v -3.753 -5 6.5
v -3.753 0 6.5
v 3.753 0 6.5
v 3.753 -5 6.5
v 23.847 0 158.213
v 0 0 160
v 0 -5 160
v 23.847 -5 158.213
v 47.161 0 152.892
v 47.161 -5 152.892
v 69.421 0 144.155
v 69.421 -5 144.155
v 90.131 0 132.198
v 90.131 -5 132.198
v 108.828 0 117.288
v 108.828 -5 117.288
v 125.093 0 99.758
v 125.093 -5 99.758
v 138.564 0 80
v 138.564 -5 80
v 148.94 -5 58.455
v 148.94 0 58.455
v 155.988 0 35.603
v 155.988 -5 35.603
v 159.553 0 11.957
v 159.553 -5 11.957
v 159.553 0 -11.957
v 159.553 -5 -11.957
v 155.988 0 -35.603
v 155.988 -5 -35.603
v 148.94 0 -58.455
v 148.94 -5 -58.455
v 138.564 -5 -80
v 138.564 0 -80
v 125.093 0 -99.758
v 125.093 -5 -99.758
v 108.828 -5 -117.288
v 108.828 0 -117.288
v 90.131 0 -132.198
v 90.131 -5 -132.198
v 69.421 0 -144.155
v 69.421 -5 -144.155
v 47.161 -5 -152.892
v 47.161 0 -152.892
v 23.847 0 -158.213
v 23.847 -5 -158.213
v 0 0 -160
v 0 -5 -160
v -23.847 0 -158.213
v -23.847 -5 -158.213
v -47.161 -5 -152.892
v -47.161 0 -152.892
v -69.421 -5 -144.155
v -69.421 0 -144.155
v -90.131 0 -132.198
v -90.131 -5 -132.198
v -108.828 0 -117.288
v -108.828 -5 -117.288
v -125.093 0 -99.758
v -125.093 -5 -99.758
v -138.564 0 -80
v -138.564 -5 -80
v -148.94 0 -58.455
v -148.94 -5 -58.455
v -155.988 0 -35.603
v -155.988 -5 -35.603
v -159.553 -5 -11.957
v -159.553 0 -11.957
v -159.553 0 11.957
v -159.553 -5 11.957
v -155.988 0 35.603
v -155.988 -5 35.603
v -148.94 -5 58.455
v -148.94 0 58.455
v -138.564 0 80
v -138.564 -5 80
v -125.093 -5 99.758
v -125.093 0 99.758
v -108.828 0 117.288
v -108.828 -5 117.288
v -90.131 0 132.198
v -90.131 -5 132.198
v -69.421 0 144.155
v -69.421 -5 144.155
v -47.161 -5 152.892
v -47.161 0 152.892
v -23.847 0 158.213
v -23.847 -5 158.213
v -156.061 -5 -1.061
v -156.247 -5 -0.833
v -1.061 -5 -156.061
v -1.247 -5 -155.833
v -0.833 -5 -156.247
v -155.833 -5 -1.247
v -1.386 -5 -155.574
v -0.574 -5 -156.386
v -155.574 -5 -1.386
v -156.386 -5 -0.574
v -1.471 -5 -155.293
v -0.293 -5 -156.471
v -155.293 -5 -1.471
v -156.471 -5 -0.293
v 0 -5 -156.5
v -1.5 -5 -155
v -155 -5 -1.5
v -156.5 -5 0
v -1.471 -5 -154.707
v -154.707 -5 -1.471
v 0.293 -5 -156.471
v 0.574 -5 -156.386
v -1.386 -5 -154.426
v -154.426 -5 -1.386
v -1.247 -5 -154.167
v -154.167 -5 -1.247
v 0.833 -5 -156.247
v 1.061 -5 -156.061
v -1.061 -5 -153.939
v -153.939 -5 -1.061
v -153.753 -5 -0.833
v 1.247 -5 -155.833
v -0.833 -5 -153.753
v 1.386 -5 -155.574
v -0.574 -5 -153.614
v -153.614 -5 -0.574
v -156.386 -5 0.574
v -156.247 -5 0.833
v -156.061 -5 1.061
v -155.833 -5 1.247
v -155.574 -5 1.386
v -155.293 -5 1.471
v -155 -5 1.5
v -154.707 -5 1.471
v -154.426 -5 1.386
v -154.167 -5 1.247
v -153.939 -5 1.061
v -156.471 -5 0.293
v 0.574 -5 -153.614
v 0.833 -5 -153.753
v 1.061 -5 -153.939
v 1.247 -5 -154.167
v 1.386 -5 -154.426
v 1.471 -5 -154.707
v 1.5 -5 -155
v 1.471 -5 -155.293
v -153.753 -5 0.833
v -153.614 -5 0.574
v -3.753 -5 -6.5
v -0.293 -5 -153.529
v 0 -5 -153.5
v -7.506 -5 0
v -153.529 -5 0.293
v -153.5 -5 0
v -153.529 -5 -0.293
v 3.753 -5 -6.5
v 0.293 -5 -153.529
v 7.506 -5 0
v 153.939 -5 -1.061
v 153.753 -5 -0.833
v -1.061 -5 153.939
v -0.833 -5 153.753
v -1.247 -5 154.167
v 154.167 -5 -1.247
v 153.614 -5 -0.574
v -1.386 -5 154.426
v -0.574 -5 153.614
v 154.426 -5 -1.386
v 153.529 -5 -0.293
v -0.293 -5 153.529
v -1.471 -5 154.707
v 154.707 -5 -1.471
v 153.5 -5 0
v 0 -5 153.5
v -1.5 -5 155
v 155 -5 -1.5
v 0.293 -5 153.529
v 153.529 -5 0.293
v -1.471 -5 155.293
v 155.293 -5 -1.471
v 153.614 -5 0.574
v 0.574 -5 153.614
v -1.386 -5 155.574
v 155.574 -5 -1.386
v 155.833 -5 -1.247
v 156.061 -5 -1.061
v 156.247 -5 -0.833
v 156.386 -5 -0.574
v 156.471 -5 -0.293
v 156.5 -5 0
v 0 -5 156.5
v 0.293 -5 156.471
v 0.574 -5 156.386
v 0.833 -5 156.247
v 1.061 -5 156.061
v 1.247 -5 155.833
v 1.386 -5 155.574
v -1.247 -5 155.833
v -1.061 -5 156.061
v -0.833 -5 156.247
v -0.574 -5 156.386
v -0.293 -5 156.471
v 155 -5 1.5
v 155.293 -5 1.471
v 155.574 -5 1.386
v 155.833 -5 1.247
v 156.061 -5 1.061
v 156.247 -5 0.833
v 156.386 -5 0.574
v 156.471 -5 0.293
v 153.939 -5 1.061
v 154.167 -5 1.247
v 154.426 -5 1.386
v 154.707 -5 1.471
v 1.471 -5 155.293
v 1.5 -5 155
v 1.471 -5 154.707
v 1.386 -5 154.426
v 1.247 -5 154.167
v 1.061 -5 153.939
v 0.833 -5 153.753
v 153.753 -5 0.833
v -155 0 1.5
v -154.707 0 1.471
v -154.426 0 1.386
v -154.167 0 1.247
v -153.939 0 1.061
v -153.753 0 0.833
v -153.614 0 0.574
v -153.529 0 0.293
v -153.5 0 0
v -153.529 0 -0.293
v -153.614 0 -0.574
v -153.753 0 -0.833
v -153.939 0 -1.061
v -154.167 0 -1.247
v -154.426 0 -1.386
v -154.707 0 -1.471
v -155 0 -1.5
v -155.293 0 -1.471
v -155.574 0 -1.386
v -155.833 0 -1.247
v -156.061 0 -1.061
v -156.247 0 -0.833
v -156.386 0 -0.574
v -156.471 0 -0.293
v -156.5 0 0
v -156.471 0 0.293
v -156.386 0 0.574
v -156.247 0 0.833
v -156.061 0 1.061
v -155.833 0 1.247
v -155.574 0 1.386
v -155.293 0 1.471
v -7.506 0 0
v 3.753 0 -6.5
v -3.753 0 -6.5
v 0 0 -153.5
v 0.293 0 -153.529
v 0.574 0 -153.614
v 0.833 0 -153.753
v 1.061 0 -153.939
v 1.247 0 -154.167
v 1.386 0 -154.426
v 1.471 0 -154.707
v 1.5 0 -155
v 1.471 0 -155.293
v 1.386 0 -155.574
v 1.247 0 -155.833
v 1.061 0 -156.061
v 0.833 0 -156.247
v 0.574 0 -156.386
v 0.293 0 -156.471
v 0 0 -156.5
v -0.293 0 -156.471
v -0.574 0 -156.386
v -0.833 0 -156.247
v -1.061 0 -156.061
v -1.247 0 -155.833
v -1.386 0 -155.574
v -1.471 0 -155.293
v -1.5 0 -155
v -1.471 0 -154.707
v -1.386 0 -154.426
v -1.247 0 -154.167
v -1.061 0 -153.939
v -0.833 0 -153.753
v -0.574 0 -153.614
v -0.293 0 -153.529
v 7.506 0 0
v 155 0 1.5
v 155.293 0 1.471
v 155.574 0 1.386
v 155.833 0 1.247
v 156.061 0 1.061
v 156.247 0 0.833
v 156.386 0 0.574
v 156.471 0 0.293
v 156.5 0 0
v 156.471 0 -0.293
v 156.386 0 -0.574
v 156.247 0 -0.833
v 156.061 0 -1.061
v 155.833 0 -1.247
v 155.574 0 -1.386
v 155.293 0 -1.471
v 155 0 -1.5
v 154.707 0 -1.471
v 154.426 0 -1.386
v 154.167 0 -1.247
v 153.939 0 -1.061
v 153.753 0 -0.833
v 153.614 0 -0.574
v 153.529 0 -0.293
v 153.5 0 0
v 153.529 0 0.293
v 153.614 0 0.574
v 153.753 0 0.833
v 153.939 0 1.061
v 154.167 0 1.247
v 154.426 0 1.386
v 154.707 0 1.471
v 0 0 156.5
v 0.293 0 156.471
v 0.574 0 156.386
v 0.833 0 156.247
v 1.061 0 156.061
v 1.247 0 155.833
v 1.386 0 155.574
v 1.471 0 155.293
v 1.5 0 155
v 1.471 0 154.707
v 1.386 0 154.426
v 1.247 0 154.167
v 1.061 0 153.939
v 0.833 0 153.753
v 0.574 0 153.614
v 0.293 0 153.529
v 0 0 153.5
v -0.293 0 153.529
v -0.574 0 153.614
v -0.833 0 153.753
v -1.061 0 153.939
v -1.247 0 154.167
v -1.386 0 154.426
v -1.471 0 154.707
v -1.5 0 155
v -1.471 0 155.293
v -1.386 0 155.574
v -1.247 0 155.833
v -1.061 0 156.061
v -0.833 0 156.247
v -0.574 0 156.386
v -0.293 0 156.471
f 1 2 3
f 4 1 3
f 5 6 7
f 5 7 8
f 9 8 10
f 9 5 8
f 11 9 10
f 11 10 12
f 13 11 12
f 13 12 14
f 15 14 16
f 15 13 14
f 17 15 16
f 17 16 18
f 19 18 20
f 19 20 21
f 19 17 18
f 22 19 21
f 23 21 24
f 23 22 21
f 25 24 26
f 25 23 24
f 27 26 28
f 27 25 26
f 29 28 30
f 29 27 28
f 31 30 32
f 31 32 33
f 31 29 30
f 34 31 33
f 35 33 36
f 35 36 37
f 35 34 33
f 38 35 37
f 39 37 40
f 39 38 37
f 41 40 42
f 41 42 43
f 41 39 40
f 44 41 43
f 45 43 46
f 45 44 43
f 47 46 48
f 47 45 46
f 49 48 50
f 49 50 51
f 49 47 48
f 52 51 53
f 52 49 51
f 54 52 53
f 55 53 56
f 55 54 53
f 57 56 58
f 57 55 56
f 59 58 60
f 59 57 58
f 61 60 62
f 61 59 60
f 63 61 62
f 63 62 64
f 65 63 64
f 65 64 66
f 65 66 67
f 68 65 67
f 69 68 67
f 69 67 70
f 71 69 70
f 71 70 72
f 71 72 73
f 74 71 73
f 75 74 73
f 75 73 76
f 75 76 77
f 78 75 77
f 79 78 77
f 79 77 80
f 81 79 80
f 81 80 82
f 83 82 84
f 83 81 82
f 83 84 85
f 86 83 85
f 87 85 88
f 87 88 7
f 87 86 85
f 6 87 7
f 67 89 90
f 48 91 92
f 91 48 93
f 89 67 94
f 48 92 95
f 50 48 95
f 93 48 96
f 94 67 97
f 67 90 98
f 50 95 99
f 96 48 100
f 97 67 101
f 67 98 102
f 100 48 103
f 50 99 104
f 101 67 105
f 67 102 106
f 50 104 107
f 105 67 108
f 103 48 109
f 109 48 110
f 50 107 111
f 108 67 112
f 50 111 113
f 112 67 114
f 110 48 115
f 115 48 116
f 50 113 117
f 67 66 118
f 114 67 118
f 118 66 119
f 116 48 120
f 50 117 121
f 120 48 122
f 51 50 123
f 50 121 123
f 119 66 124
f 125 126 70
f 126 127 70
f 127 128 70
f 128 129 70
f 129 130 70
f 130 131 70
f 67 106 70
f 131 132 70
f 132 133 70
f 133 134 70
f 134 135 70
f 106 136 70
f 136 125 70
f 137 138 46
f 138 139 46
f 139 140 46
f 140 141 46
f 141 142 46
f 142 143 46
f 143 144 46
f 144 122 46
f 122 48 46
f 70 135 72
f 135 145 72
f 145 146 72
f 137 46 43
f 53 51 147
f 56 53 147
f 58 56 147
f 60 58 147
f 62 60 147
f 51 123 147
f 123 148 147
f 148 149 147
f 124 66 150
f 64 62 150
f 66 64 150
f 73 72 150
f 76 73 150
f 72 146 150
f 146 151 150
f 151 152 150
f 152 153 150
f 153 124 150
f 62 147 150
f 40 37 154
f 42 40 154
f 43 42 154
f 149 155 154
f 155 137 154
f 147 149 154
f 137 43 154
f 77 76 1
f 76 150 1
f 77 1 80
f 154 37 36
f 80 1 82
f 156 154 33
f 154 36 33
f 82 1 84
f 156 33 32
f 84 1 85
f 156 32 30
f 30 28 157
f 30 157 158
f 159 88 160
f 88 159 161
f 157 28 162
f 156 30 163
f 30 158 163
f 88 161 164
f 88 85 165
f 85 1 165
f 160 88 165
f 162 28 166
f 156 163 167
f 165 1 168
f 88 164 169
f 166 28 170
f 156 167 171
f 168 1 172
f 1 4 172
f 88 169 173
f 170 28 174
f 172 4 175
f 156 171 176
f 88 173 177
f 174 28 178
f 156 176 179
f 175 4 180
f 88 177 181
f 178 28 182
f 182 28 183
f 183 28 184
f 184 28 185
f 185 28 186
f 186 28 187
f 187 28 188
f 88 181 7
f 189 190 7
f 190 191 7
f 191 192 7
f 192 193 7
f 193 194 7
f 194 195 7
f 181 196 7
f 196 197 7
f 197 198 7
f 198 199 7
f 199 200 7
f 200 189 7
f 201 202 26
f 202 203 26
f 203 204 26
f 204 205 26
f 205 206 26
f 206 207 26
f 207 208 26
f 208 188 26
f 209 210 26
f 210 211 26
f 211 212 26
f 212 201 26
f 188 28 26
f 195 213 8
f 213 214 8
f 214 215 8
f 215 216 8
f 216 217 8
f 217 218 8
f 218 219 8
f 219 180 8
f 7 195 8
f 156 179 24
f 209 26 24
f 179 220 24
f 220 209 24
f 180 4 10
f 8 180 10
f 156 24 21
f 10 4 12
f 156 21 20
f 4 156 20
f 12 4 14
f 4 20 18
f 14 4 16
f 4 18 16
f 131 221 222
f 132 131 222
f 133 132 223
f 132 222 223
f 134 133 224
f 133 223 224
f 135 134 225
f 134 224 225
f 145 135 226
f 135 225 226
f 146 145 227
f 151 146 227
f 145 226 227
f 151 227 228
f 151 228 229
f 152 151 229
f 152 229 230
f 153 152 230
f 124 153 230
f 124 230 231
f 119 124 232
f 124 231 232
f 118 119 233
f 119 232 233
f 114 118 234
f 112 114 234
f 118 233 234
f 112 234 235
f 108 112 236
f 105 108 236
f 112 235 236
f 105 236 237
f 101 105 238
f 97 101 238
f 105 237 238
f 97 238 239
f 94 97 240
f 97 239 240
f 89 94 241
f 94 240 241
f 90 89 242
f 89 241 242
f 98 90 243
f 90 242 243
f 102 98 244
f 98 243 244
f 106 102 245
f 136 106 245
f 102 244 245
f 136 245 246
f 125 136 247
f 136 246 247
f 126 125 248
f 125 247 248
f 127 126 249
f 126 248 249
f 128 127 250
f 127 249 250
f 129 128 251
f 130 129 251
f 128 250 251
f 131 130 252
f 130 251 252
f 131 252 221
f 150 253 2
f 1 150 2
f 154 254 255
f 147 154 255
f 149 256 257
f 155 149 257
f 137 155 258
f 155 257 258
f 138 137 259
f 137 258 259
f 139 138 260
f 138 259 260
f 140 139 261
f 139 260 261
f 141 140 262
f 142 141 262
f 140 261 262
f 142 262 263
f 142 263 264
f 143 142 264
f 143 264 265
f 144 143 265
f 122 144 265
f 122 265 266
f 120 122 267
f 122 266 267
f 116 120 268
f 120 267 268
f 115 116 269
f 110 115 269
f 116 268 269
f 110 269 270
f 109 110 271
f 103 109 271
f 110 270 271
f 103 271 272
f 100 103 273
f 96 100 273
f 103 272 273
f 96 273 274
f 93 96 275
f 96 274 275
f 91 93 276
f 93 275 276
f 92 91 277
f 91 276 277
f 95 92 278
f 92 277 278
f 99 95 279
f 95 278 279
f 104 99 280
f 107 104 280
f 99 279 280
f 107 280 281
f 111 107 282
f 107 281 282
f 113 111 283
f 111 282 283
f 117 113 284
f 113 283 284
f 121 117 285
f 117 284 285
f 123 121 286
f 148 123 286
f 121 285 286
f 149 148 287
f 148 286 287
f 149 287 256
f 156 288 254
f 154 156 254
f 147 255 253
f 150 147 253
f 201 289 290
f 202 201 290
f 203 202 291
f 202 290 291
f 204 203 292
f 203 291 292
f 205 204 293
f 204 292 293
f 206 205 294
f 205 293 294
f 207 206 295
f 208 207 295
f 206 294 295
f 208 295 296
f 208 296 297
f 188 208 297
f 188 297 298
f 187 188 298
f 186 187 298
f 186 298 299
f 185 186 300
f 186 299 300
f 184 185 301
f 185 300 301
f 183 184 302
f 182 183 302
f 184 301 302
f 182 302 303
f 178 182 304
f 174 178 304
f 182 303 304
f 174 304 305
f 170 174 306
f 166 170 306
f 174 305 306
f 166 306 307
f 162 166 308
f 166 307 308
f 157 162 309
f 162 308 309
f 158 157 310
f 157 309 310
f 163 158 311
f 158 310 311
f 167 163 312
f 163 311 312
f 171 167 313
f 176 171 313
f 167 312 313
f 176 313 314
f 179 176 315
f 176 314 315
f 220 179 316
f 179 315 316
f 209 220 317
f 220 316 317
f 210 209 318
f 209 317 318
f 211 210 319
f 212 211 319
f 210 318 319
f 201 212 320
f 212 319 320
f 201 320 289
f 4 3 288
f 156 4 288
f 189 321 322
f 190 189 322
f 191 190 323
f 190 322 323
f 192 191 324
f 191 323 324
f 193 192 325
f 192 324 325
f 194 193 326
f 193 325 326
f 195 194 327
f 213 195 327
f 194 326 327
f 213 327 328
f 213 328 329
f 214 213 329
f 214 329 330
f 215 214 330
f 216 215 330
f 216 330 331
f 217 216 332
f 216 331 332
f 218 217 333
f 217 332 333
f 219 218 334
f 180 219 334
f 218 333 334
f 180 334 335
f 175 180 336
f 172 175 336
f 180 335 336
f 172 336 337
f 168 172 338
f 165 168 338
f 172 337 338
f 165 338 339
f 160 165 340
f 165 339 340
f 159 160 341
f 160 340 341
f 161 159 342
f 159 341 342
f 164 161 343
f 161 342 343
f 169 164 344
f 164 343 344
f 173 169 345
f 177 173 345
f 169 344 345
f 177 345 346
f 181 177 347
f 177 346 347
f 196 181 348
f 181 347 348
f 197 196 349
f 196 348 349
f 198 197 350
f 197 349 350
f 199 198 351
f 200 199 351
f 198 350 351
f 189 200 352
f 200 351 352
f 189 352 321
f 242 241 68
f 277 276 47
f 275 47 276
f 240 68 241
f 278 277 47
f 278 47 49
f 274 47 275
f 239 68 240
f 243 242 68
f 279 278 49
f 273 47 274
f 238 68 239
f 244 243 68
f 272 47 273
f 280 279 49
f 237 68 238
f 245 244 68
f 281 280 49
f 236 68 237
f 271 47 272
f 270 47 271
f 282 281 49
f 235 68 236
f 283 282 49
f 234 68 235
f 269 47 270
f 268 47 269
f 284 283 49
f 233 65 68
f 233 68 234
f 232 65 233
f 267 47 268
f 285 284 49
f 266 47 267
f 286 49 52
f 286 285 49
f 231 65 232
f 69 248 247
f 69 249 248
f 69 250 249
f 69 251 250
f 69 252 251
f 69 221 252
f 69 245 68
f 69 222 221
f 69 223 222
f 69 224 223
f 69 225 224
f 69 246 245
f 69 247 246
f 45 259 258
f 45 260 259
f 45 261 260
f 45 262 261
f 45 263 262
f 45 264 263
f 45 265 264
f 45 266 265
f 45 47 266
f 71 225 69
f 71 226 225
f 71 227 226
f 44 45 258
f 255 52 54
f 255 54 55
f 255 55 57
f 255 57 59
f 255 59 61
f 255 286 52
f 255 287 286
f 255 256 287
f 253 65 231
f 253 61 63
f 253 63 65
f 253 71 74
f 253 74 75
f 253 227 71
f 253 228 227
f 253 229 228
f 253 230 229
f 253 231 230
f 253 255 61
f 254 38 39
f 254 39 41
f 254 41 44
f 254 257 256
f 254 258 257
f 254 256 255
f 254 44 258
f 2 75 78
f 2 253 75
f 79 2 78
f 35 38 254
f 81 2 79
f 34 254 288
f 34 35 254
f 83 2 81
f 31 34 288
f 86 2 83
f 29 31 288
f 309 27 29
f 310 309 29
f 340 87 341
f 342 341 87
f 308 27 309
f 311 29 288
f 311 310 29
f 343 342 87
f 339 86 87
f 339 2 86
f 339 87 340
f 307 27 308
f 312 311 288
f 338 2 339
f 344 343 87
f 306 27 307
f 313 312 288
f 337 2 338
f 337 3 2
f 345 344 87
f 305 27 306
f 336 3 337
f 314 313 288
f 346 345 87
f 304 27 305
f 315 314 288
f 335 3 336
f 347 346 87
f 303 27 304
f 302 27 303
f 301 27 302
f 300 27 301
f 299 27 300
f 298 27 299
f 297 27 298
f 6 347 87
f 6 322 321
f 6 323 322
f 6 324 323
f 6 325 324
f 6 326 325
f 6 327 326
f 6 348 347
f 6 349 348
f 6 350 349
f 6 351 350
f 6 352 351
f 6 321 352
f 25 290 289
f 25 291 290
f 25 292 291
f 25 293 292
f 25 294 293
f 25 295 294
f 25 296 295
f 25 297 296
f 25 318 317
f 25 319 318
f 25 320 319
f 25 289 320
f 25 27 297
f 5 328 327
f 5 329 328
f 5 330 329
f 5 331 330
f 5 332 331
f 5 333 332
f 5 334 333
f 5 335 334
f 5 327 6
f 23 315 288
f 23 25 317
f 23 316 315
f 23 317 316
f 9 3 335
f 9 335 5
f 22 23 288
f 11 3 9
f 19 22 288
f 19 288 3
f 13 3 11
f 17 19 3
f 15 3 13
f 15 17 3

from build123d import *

# Parameters (mm, degrees)
SKETCH1_R           = 160
SKETCH1_R_2         = 1.5
BOSS_EXTRUDE1_DEPTH = 5


with BuildPart() as part:
    # Sketch1 → Boss-Extrude1 (new body)
    with BuildSketch(Plane(origin=(0, 0, 0), x_dir=(1, 0, 0), z_dir=(0, 1, 0))):
        with Locations(Location((0, 0, 0), (0, 0, 270))):
            Circle(SKETCH1_R)
        with Locations(Location((155, 0, 0), (0, 0, 270))):
            Circle(SKETCH1_R_2, mode=Mode.SUBTRACT)
        with Locations(Location((0, -155, 0), (0, 0, 270))):
            Circle(SKETCH1_R_2, mode=Mode.SUBTRACT)
        with Locations(Location((-155, 0, 0), (0, 0, 270))):
            Circle(SKETCH1_R_2, mode=Mode.SUBTRACT)
        with Locations(Location((0, 155, 0), (0, 0, 270))):
            Circle(SKETCH1_R_2, mode=Mode.SUBTRACT)
        Polygon((7.505553499, 0), (3.75277675, 6.5), (-3.75277675, 6.5), (-7.505553499, 0), (-3.75277675, -6.5), (3.75277675, -6.5), align=None, mode=Mode.SUBTRACT)
    extrude(amount=-BOSS_EXTRUDE1_DEPTH)


solid = part.part
